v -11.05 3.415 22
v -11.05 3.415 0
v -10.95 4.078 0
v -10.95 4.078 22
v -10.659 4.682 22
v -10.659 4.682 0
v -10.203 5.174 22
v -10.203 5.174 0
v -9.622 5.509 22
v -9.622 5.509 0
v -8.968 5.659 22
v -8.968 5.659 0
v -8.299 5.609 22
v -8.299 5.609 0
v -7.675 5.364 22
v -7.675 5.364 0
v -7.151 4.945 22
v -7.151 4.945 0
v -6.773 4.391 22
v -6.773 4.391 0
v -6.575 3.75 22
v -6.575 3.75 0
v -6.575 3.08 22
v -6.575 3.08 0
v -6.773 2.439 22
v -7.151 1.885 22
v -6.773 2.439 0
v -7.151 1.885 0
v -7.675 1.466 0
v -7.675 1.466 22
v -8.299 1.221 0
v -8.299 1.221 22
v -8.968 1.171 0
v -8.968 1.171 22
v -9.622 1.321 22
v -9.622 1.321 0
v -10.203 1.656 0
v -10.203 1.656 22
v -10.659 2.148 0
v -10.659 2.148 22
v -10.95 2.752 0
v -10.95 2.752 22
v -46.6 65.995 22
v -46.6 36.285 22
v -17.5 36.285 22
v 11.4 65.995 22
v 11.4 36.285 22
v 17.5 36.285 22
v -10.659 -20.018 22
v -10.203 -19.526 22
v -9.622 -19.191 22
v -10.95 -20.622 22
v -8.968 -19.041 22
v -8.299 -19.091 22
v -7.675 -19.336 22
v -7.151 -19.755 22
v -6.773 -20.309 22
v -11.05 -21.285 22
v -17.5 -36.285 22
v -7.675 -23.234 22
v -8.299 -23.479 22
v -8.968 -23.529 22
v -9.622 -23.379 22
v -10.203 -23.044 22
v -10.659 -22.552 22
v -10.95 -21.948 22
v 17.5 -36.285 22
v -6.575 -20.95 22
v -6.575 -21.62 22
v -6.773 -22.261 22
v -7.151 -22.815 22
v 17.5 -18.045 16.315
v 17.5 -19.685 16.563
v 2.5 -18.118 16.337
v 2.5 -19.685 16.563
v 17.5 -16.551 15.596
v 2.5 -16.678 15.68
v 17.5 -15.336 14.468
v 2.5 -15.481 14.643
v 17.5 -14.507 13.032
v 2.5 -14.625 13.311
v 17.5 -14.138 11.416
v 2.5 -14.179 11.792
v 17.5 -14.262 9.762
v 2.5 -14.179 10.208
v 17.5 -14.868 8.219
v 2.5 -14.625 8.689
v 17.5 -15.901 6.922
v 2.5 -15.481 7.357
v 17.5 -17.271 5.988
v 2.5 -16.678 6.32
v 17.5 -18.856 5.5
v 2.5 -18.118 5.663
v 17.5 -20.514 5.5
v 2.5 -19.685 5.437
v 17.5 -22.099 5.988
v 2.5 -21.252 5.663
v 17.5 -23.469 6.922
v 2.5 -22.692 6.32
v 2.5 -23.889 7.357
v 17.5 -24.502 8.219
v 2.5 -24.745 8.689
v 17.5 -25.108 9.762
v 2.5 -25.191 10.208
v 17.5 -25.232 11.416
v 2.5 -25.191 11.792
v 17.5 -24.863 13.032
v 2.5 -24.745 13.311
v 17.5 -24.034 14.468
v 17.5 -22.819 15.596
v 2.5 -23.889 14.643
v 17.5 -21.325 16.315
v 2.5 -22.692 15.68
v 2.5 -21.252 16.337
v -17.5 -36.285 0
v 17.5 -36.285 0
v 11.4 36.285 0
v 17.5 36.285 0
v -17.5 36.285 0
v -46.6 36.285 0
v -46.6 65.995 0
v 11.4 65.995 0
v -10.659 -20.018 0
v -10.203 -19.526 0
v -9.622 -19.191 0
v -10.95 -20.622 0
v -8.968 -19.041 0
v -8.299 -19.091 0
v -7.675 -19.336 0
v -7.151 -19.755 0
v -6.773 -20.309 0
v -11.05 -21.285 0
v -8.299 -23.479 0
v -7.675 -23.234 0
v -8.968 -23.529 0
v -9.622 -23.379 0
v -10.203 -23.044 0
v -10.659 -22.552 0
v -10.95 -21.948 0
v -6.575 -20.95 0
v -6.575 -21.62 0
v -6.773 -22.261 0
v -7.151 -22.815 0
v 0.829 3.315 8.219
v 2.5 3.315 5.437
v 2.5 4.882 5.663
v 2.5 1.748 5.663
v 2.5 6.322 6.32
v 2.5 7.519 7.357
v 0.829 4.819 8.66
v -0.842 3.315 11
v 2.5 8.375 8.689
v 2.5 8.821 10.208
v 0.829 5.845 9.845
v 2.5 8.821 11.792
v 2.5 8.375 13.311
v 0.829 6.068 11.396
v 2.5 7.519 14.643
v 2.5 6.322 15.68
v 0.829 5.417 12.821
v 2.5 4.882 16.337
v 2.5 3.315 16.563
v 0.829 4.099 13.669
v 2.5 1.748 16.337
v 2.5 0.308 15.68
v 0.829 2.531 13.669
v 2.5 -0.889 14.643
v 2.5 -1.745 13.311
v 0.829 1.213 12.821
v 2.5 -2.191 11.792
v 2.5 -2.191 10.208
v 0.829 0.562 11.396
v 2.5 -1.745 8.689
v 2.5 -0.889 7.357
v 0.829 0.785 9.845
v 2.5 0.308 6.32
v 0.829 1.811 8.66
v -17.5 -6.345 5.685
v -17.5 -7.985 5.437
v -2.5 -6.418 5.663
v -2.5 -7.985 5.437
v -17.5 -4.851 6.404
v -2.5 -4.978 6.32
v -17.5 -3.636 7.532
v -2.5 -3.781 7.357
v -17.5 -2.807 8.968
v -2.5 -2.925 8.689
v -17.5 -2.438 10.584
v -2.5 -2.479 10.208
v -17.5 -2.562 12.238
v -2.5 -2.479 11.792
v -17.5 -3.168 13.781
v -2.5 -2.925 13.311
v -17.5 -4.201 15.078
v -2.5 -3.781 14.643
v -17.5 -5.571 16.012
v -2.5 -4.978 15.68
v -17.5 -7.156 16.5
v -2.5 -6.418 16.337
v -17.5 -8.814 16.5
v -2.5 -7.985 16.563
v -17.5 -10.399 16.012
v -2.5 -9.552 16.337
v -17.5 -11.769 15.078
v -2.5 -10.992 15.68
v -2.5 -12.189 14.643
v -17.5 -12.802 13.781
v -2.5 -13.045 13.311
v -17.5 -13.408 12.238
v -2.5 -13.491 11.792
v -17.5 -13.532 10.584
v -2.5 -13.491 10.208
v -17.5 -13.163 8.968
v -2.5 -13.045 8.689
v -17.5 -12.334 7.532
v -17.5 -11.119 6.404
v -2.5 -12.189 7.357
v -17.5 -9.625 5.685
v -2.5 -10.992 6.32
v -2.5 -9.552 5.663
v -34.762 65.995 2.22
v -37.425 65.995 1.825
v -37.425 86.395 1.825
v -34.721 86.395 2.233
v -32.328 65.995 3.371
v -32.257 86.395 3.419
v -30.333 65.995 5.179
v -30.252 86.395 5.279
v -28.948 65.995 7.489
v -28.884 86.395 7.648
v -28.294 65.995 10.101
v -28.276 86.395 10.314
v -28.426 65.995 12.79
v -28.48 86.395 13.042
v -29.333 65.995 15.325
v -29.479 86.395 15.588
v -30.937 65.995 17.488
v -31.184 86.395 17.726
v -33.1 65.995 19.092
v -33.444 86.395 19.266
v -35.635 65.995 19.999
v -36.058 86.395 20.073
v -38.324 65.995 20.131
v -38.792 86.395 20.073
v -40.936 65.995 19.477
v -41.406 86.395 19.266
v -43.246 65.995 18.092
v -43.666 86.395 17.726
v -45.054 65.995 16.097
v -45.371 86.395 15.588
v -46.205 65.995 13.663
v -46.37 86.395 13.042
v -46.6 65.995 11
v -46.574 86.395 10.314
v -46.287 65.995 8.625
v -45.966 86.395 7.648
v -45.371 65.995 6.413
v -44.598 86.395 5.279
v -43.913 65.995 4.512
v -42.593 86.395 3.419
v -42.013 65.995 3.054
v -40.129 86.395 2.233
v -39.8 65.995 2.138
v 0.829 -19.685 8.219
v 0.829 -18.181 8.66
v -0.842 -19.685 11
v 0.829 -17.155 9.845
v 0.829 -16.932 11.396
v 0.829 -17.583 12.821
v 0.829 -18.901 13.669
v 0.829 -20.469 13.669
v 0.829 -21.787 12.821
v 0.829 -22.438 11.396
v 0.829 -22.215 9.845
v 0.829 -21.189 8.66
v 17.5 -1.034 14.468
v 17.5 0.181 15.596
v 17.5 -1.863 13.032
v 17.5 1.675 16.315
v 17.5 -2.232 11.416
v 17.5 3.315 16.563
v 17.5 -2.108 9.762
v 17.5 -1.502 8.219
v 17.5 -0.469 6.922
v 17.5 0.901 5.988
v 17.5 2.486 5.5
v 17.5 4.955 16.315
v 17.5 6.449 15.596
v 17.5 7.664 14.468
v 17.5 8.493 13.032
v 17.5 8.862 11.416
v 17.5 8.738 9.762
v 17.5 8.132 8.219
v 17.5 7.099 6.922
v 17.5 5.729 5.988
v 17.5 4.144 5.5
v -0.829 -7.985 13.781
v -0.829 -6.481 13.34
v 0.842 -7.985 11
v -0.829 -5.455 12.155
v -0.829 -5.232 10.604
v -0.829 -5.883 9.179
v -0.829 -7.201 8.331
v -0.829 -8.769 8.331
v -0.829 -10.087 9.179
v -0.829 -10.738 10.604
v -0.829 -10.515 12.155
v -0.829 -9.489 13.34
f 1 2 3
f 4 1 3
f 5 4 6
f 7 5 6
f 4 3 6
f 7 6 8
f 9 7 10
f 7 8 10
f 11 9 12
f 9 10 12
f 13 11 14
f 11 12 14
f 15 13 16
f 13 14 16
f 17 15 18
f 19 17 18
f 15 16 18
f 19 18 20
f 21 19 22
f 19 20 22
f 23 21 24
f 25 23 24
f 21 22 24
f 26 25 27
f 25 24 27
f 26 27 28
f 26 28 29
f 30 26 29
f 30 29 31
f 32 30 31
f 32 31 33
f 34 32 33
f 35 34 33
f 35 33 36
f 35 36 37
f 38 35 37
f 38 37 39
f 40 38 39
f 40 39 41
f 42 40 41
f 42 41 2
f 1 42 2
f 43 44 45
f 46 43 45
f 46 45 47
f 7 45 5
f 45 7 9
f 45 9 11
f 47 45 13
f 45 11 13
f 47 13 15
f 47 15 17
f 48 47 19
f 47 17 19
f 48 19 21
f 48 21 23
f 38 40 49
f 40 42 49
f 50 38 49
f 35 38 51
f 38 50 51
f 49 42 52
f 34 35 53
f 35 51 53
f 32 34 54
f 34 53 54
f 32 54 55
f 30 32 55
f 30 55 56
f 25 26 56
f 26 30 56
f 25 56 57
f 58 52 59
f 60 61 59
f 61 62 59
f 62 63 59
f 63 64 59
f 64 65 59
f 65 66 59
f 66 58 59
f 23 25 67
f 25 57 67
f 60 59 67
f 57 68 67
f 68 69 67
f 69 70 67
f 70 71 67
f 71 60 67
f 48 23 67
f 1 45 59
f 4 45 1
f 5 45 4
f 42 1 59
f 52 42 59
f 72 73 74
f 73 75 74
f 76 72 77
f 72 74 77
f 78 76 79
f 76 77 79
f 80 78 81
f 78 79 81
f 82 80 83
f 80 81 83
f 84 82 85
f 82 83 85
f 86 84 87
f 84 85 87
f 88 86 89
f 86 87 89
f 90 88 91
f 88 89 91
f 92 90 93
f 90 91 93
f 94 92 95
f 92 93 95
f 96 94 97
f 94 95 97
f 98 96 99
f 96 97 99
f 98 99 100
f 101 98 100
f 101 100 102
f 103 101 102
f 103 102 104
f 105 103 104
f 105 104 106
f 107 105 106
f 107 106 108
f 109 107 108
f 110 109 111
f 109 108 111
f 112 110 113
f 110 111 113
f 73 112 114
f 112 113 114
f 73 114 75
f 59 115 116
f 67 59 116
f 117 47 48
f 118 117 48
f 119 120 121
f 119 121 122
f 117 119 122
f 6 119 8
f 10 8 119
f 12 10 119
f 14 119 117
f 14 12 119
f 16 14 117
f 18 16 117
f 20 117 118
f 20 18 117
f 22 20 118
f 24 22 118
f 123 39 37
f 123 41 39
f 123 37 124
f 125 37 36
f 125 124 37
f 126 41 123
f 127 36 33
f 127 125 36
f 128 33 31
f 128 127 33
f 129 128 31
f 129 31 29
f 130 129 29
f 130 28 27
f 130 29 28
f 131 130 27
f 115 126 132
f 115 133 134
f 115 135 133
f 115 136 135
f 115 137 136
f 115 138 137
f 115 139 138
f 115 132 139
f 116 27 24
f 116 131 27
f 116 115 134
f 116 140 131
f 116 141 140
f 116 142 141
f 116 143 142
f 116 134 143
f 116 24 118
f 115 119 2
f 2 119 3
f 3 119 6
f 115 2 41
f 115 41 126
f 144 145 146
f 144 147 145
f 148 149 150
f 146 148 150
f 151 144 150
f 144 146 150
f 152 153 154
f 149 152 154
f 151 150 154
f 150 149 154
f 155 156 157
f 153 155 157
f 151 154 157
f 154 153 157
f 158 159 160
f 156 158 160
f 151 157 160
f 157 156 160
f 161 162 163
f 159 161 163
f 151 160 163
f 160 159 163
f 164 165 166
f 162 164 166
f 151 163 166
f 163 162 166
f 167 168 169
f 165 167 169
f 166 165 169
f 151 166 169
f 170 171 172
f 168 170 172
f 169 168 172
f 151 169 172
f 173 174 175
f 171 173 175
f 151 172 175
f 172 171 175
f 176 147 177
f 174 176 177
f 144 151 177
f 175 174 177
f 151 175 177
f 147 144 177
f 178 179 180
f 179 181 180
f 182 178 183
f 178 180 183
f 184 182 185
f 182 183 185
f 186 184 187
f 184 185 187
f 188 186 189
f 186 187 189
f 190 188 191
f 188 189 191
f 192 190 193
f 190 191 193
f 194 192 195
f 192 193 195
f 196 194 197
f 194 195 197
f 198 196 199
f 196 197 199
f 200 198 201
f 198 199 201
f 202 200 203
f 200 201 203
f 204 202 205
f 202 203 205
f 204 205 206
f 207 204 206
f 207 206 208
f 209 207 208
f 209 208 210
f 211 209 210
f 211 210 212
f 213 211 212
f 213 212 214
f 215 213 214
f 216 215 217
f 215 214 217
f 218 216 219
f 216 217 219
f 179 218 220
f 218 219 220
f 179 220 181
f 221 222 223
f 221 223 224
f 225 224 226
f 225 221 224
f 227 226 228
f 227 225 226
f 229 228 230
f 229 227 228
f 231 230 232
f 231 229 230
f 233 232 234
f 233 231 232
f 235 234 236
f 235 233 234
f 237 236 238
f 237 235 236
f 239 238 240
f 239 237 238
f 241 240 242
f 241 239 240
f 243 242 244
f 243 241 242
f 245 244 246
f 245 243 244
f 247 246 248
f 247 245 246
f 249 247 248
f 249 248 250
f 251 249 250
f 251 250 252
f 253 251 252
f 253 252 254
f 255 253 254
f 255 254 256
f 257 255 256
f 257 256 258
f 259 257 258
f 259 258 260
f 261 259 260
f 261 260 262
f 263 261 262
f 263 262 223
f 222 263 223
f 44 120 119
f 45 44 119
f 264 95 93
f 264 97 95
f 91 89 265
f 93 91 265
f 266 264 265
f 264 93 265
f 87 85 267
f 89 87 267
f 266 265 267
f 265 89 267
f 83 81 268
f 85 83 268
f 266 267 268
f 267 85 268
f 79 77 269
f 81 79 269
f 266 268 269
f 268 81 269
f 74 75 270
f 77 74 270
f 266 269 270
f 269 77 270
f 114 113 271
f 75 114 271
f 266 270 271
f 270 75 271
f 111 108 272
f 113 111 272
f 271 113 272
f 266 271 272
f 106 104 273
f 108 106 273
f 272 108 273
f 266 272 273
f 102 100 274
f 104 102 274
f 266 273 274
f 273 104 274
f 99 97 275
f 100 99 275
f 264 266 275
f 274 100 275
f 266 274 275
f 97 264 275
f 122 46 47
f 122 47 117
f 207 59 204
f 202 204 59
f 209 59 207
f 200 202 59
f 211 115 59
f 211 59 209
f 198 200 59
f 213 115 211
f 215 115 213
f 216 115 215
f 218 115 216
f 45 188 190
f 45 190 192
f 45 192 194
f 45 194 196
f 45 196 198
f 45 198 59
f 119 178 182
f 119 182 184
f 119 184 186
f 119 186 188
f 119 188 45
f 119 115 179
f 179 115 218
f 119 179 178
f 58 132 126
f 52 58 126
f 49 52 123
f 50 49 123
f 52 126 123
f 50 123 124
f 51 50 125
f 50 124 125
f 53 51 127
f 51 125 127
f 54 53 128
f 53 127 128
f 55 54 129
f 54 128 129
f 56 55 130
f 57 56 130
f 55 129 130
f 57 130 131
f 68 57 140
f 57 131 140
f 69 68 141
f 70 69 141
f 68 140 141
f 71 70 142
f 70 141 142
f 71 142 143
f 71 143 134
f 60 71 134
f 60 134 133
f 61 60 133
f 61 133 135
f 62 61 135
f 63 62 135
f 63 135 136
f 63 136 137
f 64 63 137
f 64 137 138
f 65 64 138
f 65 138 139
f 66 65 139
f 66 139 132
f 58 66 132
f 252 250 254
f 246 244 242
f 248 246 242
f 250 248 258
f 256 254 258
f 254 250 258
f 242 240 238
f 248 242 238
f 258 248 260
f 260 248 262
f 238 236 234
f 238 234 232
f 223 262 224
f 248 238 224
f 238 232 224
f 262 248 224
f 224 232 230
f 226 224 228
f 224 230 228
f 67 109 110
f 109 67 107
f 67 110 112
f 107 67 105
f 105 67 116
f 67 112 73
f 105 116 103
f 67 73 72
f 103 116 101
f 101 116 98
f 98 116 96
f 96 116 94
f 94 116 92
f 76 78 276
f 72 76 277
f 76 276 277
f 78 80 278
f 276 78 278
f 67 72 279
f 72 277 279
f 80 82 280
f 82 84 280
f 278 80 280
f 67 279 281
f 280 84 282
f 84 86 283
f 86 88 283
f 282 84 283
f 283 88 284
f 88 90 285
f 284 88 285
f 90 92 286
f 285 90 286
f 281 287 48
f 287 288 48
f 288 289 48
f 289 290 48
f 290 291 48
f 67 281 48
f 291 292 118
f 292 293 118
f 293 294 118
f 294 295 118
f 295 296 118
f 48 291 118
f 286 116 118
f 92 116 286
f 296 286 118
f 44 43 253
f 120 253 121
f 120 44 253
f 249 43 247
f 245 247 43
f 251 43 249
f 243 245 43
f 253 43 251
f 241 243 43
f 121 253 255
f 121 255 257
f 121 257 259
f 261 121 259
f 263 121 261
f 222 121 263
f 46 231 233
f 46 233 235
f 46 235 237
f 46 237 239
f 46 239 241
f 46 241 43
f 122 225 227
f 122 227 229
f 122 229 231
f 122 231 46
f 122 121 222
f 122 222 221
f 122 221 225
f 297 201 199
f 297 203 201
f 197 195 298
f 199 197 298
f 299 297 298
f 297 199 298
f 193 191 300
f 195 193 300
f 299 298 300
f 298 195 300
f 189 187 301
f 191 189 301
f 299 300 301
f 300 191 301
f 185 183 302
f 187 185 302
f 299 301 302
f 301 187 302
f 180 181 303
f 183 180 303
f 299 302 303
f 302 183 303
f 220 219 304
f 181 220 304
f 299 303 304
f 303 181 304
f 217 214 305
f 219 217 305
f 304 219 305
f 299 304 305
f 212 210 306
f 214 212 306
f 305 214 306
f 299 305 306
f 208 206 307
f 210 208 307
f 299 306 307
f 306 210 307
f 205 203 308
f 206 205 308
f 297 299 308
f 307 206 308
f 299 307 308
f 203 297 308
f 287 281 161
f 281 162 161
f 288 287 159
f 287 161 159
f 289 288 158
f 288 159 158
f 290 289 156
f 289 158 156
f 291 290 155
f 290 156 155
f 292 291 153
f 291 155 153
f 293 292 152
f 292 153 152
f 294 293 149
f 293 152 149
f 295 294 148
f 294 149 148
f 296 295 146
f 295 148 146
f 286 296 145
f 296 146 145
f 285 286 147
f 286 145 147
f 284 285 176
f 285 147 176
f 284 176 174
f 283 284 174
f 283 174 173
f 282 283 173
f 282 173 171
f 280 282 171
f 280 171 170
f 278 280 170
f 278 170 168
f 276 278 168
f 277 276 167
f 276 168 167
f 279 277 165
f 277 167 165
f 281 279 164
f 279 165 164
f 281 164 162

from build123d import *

# Parameters (mm, degrees)
SKETCH1_W                         = 35
SKETCH1_H                         = 72.57
BOSS_EXTRUDE1_DEPTH               = 22
SKETCH2_W                         = 58
SKETCH2_H                         = 22
BOSS_EXTRUDE2_DEPTH               = 29.71
SKETCH3_R                         = 9.175
BOSS_EXTRUDE3_DEPTH               = 50.11
M4_CLEARANCE_HOLE1_D              = 4.5
PIPE_TAP_DRILL_FOR_1_4_TAP1_D     = 11.1252
PIPE_TAP_DRILL_FOR_1_4_TAP1_DEPTH = 15
PIPE_TAP_DRILL_FOR_1_4_TAP1_TIP   = 3.342347279
PIPE_TAP_DRILL_FOR_1_4_TAP2_D     = 11.1252
PIPE_TAP_DRILL_FOR_1_4_TAP2_DEPTH = 15
PIPE_TAP_DRILL_FOR_1_4_TAP2_TIP   = 3.342347279


with BuildPart() as part:
    # Sketch1 → Boss-Extrude1 (new body)
    with BuildSketch(Plane.XY):
        Rectangle(SKETCH1_W, SKETCH1_H)
    extrude(amount=BOSS_EXTRUDE1_DEPTH)

    # Sketch2 → Boss-Extrude2 (add)
    with BuildSketch(Plane(origin=(0, 36.285, 0), x_dir=(1, 0, 0), z_dir=(0, 1, 0))):
        with Locations((-17.6, -11)):
            Rectangle(SKETCH2_W, SKETCH2_H)
    extrude(amount=BOSS_EXTRUDE2_DEPTH)

    # Sketch3 → Boss-Extrude3 (add)
    with BuildSketch(Plane.XZ.offset(-36.285)):
        with Locations((-37.425, 11)):
            Circle(SKETCH3_R)
    extrude(amount=-BOSS_EXTRUDE3_DEPTH)

    # M4 Clearance Hole1 (through all)
    with Locations(Plane.XY.offset(22)):
        with Locations((-8.8, 3.415), (-8.8, -21.285)):
            Hole(M4_CLEARANCE_HOLE1_D / 2)

    # Pipe Tap Drill for 1/4 Tap1
    with Locations(Plane.ZY.offset(17.5)):
        with Locations((11, -7.985)):
            Hole(PIPE_TAP_DRILL_FOR_1_4_TAP1_D / 2, depth=PIPE_TAP_DRILL_FOR_1_4_TAP1_DEPTH)
            with Locations((0, 0, -(PIPE_TAP_DRILL_FOR_1_4_TAP1_DEPTH + PIPE_TAP_DRILL_FOR_1_4_TAP1_TIP / 2))):  # 118° drill point
                Cone(0, PIPE_TAP_DRILL_FOR_1_4_TAP1_D / 2, PIPE_TAP_DRILL_FOR_1_4_TAP1_TIP, mode=Mode.SUBTRACT)

    # Pipe Tap Drill for 1/4 Tap2
    with Locations(Plane(origin=(17.5, 0, 0), x_dir=(0, 0, -1), z_dir=(1, 0, 0))):
        with Locations((-11, 3.315), (-11, -19.685)):
            Hole(PIPE_TAP_DRILL_FOR_1_4_TAP2_D / 2, depth=PIPE_TAP_DRILL_FOR_1_4_TAP2_DEPTH)
            with Locations((0, 0, -(PIPE_TAP_DRILL_FOR_1_4_TAP2_DEPTH + PIPE_TAP_DRILL_FOR_1_4_TAP2_TIP / 2))):  # 118° drill point
                Cone(0, PIPE_TAP_DRILL_FOR_1_4_TAP2_D / 2, PIPE_TAP_DRILL_FOR_1_4_TAP2_TIP, mode=Mode.SUBTRACT)


solid = part.part
